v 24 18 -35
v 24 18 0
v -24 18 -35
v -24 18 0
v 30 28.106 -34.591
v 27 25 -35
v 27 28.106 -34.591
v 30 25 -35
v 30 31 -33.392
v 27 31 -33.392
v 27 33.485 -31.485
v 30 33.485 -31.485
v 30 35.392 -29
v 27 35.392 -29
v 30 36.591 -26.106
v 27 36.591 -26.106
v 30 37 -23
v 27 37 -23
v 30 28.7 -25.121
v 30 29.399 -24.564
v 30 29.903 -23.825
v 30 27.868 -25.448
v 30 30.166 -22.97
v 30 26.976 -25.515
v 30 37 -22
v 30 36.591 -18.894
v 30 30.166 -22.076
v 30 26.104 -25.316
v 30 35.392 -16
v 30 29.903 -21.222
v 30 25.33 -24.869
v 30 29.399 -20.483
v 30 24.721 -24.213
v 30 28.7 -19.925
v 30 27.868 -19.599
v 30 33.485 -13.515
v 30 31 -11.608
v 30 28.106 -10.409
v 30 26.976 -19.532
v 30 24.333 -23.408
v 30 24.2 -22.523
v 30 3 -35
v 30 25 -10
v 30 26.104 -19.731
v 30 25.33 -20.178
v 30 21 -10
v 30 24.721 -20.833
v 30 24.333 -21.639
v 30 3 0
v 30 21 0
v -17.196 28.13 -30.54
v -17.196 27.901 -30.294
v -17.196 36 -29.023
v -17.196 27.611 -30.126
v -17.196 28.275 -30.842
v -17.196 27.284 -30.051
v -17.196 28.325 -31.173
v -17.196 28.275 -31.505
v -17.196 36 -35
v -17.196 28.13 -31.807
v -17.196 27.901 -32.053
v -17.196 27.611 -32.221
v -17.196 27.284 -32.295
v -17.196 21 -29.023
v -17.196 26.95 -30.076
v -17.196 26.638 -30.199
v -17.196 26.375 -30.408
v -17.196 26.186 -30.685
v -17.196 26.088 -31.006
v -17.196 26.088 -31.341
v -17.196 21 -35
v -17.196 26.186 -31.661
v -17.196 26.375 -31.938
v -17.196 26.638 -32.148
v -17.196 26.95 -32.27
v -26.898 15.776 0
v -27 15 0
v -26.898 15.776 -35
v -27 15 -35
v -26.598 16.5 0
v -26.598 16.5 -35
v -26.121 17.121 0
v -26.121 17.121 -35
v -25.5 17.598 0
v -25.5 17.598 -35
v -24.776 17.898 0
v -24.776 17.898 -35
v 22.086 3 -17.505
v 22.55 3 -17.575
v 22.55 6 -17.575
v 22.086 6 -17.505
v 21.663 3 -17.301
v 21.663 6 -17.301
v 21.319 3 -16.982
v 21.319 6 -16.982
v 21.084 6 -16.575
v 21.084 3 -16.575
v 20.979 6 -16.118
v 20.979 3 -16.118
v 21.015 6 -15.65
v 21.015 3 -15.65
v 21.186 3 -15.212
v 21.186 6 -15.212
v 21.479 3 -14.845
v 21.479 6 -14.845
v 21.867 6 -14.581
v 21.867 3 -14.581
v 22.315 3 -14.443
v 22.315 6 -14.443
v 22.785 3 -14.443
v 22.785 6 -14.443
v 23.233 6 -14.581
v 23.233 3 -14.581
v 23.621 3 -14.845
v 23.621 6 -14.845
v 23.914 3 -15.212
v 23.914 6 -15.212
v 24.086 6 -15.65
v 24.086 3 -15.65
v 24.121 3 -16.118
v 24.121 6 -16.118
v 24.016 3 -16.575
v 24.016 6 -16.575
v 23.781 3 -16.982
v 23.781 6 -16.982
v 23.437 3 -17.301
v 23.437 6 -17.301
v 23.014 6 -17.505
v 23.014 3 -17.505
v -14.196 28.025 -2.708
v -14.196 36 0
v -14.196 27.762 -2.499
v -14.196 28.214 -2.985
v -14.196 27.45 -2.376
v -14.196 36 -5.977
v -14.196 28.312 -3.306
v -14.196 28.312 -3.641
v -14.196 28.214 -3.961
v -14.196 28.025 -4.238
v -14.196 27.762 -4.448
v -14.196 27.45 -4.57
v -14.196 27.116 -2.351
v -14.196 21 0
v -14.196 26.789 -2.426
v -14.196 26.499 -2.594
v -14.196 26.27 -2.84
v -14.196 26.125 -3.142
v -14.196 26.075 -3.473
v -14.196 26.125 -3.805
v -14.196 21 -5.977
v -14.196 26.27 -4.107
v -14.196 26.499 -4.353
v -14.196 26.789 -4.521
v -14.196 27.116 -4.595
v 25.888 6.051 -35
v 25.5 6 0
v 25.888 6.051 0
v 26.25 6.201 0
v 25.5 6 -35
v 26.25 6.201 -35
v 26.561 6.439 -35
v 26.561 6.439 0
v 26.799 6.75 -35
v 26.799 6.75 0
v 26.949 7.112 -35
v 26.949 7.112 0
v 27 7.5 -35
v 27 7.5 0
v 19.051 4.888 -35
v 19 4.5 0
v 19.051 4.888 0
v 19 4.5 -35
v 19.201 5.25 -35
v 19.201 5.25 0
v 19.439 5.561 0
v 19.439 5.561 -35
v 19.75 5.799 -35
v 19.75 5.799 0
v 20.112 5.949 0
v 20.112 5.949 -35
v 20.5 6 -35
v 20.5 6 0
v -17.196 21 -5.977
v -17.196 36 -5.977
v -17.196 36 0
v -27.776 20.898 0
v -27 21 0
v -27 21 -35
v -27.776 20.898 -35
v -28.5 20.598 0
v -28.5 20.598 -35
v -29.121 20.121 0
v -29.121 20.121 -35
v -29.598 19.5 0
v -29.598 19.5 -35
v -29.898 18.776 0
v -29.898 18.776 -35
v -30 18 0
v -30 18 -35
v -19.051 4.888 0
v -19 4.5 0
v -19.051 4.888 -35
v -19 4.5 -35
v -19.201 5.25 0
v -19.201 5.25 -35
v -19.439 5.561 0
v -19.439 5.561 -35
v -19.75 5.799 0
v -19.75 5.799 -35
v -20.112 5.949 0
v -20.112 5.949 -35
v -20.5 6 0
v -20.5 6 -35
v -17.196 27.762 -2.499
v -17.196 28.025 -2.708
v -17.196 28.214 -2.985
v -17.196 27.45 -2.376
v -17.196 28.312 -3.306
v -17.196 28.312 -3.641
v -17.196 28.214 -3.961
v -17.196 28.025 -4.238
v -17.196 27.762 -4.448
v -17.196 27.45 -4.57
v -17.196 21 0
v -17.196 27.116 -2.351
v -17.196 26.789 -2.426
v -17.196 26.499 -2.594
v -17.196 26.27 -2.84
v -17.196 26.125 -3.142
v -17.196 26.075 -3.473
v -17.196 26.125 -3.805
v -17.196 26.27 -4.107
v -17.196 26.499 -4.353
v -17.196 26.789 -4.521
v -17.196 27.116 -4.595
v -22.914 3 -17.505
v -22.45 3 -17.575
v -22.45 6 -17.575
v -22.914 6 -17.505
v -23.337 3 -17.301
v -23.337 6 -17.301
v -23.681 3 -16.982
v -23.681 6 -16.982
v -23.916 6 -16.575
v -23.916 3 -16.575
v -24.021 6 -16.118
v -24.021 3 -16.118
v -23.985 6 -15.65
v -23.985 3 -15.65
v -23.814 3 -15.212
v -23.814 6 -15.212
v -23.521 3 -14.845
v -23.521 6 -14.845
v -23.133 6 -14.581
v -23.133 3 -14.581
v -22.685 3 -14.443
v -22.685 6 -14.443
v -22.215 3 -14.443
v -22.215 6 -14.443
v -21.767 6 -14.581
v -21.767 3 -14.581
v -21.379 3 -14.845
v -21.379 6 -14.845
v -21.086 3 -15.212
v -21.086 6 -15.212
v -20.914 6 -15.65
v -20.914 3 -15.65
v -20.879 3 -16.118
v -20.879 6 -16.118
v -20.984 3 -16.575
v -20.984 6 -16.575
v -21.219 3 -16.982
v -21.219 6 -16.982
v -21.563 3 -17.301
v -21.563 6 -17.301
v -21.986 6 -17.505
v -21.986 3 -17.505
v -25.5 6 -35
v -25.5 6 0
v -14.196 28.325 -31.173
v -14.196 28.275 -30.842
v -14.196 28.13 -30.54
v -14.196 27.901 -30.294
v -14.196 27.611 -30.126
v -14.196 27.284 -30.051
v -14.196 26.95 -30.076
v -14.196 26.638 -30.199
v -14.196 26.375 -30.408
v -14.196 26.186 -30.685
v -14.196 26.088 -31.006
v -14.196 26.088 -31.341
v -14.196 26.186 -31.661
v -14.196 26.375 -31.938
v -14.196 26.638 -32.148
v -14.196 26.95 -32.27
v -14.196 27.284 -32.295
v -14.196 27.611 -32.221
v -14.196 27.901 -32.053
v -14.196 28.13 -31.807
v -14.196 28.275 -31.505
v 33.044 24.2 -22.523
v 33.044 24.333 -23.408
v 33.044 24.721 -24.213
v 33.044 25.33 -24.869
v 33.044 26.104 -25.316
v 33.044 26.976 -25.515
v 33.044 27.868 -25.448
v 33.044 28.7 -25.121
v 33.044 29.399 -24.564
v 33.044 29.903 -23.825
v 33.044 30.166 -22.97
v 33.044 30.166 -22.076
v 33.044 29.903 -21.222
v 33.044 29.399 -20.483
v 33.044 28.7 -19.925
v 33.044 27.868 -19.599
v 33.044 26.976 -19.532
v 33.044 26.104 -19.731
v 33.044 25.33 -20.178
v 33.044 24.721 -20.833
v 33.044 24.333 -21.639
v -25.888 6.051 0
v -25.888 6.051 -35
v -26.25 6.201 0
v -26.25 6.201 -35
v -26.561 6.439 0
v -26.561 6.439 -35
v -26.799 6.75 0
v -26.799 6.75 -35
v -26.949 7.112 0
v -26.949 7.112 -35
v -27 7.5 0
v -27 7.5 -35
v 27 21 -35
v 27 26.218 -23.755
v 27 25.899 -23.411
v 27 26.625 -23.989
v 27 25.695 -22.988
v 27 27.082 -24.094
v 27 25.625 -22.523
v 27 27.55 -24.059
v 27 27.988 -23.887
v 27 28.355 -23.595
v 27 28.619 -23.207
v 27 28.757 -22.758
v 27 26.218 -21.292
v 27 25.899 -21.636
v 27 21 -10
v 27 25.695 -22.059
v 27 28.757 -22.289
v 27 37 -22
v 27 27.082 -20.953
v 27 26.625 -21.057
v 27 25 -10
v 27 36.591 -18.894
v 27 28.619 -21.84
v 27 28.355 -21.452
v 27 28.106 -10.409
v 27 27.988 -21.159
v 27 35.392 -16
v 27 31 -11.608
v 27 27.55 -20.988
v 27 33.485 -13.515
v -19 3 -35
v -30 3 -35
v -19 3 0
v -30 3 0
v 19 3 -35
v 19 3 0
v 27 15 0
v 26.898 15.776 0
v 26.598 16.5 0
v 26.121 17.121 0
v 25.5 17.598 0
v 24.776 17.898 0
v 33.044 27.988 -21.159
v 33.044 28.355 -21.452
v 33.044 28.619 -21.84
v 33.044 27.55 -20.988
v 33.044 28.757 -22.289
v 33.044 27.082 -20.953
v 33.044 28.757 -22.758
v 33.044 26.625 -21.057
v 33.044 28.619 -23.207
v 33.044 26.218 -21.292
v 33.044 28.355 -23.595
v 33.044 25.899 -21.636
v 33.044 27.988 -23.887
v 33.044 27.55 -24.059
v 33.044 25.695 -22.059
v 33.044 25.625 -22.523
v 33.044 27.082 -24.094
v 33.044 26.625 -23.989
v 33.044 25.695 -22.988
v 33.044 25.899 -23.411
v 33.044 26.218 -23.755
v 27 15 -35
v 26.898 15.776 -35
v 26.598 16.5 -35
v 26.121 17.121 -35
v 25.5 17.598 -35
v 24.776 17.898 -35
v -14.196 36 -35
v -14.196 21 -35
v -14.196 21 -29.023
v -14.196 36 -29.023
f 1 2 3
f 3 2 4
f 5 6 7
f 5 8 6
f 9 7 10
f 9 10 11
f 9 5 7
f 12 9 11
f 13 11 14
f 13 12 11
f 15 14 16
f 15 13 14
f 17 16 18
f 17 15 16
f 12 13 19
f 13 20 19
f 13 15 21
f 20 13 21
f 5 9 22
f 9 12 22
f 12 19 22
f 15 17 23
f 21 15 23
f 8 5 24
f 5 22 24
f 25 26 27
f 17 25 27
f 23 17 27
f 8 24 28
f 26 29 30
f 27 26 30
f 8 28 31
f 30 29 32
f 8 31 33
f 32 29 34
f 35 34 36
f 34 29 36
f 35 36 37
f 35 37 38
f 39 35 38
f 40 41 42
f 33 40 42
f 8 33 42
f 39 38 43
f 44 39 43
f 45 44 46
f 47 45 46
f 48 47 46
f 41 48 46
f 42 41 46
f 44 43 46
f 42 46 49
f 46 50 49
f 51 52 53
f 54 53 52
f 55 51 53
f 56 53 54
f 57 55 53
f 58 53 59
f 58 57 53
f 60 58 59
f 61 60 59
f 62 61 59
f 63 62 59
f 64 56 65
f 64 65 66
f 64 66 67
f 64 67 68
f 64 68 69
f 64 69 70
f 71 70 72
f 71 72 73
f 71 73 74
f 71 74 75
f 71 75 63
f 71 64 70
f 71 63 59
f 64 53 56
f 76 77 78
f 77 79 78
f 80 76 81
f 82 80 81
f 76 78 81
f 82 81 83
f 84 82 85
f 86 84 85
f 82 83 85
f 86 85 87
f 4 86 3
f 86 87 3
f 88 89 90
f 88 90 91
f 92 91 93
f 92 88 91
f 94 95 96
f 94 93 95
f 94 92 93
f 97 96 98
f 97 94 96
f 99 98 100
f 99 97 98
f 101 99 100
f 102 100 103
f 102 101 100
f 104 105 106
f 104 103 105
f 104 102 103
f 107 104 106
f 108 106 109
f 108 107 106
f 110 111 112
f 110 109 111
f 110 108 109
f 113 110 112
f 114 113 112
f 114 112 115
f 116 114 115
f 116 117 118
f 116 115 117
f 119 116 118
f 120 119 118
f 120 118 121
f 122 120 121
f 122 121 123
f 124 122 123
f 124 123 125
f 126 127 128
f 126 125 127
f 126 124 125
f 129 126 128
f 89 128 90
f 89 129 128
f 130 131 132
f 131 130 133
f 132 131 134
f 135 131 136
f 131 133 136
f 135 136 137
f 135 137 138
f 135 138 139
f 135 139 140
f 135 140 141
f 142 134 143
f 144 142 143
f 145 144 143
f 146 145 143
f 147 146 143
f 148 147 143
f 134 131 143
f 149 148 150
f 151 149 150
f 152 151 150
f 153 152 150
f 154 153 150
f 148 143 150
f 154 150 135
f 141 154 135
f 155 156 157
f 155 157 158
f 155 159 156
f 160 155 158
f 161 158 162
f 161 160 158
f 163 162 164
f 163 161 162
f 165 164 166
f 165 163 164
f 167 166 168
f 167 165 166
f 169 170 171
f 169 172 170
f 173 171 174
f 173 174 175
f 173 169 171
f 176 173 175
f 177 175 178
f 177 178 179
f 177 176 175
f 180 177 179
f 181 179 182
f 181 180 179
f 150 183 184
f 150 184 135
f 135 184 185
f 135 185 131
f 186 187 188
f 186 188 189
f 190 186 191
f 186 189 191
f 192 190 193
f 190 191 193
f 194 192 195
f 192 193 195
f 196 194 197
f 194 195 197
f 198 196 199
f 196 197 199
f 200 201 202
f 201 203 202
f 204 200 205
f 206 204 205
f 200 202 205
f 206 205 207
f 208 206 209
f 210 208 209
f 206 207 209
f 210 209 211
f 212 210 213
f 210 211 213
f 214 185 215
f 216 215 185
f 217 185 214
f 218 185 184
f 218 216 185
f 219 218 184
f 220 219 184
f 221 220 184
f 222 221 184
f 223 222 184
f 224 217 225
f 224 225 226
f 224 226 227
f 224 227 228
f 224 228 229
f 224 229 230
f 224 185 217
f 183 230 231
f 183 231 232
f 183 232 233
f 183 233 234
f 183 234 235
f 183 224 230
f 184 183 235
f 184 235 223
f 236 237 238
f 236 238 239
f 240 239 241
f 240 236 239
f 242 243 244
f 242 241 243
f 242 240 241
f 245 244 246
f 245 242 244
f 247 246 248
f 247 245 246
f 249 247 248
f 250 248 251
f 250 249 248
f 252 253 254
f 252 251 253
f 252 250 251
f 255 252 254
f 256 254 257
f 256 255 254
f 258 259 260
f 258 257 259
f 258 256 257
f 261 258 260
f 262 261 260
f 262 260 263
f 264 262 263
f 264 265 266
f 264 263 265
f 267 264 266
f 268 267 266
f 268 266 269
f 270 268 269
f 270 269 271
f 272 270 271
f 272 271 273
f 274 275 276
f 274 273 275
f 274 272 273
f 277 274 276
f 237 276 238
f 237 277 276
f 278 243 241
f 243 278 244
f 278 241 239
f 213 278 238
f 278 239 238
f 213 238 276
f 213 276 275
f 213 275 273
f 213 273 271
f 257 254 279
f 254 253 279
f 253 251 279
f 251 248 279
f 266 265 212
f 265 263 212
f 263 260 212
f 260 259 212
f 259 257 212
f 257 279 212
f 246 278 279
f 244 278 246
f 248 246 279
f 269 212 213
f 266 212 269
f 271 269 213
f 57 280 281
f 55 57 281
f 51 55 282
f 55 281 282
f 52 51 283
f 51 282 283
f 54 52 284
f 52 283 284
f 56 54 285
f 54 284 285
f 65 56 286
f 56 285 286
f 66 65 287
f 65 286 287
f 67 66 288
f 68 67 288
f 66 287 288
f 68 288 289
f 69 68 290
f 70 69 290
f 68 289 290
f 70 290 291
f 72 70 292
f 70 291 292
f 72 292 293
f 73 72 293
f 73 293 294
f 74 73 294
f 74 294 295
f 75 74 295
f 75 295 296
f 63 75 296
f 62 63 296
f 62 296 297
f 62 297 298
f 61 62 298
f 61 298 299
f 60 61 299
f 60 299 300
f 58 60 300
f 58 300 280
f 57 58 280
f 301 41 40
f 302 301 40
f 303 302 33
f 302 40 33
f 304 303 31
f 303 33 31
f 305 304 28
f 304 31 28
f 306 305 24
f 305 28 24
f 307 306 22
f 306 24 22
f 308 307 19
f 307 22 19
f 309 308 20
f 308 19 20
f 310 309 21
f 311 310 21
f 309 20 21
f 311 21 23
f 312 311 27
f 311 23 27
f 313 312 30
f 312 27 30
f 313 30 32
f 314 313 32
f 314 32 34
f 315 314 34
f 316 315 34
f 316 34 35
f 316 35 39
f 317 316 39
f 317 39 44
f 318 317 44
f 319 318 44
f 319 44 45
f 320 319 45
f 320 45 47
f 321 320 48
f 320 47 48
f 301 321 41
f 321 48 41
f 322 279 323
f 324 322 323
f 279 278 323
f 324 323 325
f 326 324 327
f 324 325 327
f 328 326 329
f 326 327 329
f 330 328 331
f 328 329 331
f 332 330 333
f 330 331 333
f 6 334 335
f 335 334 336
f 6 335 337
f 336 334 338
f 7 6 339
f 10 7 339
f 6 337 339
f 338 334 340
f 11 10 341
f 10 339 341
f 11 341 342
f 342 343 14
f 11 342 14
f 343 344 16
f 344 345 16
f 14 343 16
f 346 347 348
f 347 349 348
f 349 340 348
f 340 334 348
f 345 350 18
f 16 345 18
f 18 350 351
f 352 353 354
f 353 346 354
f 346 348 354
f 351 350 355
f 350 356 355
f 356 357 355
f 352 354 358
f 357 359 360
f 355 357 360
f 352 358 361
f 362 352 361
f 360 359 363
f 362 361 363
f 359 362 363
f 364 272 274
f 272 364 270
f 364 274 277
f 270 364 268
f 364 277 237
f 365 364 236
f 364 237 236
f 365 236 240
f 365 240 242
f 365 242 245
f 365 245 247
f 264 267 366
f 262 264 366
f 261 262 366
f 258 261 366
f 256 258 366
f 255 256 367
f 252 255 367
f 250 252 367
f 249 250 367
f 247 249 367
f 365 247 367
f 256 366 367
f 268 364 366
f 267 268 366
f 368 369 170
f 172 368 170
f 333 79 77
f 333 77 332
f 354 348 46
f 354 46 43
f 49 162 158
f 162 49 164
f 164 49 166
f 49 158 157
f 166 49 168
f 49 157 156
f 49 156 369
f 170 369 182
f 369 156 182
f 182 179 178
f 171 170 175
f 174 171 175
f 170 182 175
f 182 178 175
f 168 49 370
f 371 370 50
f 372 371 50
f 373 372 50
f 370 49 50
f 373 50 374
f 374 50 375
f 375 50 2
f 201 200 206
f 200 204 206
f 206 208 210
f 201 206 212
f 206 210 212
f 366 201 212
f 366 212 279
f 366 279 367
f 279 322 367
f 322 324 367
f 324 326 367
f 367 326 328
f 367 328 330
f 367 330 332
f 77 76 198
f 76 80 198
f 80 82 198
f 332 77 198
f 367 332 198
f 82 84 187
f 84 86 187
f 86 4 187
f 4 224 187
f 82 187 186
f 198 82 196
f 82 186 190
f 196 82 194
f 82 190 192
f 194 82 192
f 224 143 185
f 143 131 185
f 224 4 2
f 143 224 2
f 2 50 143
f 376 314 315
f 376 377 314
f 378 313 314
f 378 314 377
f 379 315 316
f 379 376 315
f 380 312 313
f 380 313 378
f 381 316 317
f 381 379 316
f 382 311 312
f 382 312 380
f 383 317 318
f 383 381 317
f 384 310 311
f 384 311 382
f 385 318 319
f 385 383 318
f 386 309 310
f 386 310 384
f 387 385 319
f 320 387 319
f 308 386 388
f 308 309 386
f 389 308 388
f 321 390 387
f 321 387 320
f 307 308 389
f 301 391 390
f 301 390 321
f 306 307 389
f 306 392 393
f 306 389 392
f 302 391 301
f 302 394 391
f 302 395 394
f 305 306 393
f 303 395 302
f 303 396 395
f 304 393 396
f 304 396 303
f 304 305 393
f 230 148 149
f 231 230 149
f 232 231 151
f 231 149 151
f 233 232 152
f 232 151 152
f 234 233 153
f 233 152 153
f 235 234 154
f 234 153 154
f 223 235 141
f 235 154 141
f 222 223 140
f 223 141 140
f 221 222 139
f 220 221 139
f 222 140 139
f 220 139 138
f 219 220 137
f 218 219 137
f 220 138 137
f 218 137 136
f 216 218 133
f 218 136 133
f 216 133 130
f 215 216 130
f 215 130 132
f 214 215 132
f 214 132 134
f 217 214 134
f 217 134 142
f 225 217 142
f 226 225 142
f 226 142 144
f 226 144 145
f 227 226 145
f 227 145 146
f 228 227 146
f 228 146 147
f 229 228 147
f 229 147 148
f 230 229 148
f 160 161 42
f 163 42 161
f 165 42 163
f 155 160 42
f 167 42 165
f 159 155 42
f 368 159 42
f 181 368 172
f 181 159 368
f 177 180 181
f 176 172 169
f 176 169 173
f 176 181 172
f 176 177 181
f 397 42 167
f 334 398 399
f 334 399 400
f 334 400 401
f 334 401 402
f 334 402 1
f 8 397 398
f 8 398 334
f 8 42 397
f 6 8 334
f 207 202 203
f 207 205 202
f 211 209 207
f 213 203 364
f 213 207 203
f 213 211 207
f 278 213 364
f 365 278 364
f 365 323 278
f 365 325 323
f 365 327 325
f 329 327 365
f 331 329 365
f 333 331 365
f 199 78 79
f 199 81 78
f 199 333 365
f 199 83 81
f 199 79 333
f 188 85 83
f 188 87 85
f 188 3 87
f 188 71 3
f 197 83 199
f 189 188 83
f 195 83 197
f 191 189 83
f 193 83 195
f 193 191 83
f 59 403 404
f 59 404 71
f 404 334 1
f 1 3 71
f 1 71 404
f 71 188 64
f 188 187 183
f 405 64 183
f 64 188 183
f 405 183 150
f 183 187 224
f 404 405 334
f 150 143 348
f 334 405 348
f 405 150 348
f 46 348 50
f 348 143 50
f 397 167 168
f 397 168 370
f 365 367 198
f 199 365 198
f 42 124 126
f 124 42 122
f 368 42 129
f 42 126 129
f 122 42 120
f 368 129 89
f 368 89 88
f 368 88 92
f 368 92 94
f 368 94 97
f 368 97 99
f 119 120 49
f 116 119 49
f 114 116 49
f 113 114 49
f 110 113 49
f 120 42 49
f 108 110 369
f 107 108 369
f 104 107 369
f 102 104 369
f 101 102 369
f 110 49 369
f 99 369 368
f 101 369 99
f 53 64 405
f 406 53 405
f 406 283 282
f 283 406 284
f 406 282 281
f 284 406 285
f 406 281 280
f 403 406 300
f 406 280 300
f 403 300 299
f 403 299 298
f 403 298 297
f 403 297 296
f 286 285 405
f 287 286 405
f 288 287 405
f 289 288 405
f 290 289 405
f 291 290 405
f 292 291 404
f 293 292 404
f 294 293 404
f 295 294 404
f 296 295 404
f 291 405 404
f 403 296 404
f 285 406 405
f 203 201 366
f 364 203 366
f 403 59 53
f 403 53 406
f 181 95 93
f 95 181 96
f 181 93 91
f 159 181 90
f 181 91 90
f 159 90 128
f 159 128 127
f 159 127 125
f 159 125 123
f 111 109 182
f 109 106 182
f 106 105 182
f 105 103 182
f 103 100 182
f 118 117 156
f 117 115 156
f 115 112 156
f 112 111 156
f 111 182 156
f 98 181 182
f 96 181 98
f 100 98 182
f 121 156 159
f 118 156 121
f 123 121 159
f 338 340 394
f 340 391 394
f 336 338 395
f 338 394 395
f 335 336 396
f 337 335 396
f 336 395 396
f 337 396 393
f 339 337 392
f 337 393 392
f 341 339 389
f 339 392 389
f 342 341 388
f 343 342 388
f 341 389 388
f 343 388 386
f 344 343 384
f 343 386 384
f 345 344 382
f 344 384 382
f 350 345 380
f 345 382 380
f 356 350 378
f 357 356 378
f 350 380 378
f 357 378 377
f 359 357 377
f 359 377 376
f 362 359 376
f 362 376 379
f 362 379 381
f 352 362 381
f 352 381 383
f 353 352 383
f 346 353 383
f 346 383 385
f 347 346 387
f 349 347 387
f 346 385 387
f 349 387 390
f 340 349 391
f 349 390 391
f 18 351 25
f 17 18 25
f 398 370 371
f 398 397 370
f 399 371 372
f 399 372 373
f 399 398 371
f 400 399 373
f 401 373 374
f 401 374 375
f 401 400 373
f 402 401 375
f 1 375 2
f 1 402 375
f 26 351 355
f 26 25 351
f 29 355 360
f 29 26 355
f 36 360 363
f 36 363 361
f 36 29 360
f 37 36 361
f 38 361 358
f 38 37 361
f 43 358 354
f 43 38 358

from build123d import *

# Parameters (mm, degrees)
BOSS_EXTRUDE1_DEPTH     = 35
SKETCH3_R               = 1.575
CUT_EXTRUDE1_DEPTH      = 10
CUT_EXTRUDE2_DEPTH      = 79.70196948
CUT_EXTRUDE2_DEPTH_BACK = 10
SKETCH5_W               = 10
SKETCH5_H               = 16
FILLET2_R               = 12
FILLET3_R               = 3
FILLET4_R               = 1.5
SKETCH6_W               = 3
SKETCH6_H               = 5.976707935
BOSS_EXTRUDE2_DEPTH     = 15
SKETCH8_R               = 1.125
CUT_EXTRUDE3_DEPTH      = 25
SKETCH10_R              = 3
BOSS_EXTRUDE3_DEPTH     = 3.044394089
SKETCH11_R              = 1.575
CUT_EXTRUDE4_DEPTH      = 7.5


with BuildPart() as part:
    # Sketch2 → Boss-Extrude1 (new body)
    with BuildSketch(Plane.XY):
        Polygon((27, 21), (27, 37), (30, 37), (30, 3), (19, 3), (19, 6), (27, 6), (27, 18), (-27, 18), (-27, 6), (-19, 6), (-19, 3), (-30, 3), (-30, 21), align=None)
    extrude(amount=-BOSS_EXTRUDE1_DEPTH)

    # Sketch3 → Cut-Extrude1 (cut)
    with BuildSketch(Plane(origin=(0, 0, 0), x_dir=(1, 0, 0), z_dir=(0, 1, 0))):
        with Locations(Location((-22.449984171, 16, 0), (0, 0, 90))):
            Circle(SKETCH3_R)
        with Locations(Location((22.550015829, 16, 0), (0, 0, 90))):
            Circle(SKETCH3_R)
    extrude(amount=CUT_EXTRUDE1_DEPTH, mode=Mode.SUBTRACT)

    # Sketch5 → Cut-Extrude2 (cut, two sides: drawn at the far end of the back side and taken through both)
    with BuildSketch(Plane(origin=(30, 0, 0), x_dir=(0, 0, -1), z_dir=(1, 0, 0)).offset(-CUT_EXTRUDE2_DEPTH_BACK)):
        with Locations((5, 29)):
            Rectangle(SKETCH5_W, SKETCH5_H)
    extrude(amount=CUT_EXTRUDE2_DEPTH + CUT_EXTRUDE2_DEPTH_BACK, mode=Mode.SUBTRACT)

    # Fillet2
    fillet2_edges = [part.edges().sort_by_distance(p)[0] for p in [
        (28.5, 37, -10),
        (28.5, 37, -35),
    ]]
    fillet(fillet2_edges, radius=FILLET2_R)

    # Fillet3
    fillet3_edges = [part.edges().sort_by_distance(p)[0] for p in [
        (27, 18, -17.5),
        (-27, 18, -17.5),
        (-30, 21, -17.5),
    ]]
    fillet(fillet3_edges, radius=FILLET3_R)

    # Fillet4
    fillet4_edges = [part.edges().sort_by_distance(p)[0] for p in [
        (19, 6, -17.5),
        (27, 6, -17.5),
        (-27, 6, -17.5),
        (-19, 6, -17.5),
    ]]
    fillet(fillet4_edges, radius=FILLET4_R)

    # Sketch6 → Boss-Extrude2 (add)
    with BuildSketch(Plane(origin=(0, 21, 0), x_dir=(1, 0, 0), z_dir=(0, 1, 0))):
        with Locations((-15.696239988, 32.011646033)):
            Rectangle(SKETCH6_W, SKETCH6_H)
        with Locations((-15.696239988, 2.988353968)):
            Rectangle(SKETCH6_W, SKETCH6_H)
    extrude(amount=BOSS_EXTRUDE2_DEPTH)

    # Sketch8 → Cut-Extrude3 (cut)
    with BuildSketch(Plane(origin=(0, 0, 0), x_dir=(0, 0, -1), z_dir=(1, 0, 0))):
        with Locations(Location((3.473292065, 27.2, 0), (0, 0, 270))):
            Circle(SKETCH8_R)
        with Locations(Location((31.173292065, 27.2, 0), (0, 0, 90))):
            Circle(SKETCH8_R)
    extrude(amount=-CUT_EXTRUDE3_DEPTH, mode=Mode.SUBTRACT)

    # Sketch10 → Boss-Extrude3 (add)
    with BuildSketch(Plane(origin=(30, 0, 0), x_dir=(0, 0, -1), z_dir=(1, 0, 0))):
        with Locations(Location((22.523292065, 27.2, 0), (0, 0, 270))):
            Circle(SKETCH10_R)
    extrude(amount=BOSS_EXTRUDE3_DEPTH)

    # Sketch11 → Cut-Extrude4 (cut, symmetric)
    with BuildSketch(Plane(origin=(30, 0, 0), x_dir=(0, 0, -1), z_dir=(1, 0, 0))):
        with Locations(Location((22.523292065, 27.2, 0), (0, 0, 270))):
            Circle(SKETCH11_R)
    extrude(amount=CUT_EXTRUDE4_DEPTH, both=True, mode=Mode.SUBTRACT)


solid = part.part
